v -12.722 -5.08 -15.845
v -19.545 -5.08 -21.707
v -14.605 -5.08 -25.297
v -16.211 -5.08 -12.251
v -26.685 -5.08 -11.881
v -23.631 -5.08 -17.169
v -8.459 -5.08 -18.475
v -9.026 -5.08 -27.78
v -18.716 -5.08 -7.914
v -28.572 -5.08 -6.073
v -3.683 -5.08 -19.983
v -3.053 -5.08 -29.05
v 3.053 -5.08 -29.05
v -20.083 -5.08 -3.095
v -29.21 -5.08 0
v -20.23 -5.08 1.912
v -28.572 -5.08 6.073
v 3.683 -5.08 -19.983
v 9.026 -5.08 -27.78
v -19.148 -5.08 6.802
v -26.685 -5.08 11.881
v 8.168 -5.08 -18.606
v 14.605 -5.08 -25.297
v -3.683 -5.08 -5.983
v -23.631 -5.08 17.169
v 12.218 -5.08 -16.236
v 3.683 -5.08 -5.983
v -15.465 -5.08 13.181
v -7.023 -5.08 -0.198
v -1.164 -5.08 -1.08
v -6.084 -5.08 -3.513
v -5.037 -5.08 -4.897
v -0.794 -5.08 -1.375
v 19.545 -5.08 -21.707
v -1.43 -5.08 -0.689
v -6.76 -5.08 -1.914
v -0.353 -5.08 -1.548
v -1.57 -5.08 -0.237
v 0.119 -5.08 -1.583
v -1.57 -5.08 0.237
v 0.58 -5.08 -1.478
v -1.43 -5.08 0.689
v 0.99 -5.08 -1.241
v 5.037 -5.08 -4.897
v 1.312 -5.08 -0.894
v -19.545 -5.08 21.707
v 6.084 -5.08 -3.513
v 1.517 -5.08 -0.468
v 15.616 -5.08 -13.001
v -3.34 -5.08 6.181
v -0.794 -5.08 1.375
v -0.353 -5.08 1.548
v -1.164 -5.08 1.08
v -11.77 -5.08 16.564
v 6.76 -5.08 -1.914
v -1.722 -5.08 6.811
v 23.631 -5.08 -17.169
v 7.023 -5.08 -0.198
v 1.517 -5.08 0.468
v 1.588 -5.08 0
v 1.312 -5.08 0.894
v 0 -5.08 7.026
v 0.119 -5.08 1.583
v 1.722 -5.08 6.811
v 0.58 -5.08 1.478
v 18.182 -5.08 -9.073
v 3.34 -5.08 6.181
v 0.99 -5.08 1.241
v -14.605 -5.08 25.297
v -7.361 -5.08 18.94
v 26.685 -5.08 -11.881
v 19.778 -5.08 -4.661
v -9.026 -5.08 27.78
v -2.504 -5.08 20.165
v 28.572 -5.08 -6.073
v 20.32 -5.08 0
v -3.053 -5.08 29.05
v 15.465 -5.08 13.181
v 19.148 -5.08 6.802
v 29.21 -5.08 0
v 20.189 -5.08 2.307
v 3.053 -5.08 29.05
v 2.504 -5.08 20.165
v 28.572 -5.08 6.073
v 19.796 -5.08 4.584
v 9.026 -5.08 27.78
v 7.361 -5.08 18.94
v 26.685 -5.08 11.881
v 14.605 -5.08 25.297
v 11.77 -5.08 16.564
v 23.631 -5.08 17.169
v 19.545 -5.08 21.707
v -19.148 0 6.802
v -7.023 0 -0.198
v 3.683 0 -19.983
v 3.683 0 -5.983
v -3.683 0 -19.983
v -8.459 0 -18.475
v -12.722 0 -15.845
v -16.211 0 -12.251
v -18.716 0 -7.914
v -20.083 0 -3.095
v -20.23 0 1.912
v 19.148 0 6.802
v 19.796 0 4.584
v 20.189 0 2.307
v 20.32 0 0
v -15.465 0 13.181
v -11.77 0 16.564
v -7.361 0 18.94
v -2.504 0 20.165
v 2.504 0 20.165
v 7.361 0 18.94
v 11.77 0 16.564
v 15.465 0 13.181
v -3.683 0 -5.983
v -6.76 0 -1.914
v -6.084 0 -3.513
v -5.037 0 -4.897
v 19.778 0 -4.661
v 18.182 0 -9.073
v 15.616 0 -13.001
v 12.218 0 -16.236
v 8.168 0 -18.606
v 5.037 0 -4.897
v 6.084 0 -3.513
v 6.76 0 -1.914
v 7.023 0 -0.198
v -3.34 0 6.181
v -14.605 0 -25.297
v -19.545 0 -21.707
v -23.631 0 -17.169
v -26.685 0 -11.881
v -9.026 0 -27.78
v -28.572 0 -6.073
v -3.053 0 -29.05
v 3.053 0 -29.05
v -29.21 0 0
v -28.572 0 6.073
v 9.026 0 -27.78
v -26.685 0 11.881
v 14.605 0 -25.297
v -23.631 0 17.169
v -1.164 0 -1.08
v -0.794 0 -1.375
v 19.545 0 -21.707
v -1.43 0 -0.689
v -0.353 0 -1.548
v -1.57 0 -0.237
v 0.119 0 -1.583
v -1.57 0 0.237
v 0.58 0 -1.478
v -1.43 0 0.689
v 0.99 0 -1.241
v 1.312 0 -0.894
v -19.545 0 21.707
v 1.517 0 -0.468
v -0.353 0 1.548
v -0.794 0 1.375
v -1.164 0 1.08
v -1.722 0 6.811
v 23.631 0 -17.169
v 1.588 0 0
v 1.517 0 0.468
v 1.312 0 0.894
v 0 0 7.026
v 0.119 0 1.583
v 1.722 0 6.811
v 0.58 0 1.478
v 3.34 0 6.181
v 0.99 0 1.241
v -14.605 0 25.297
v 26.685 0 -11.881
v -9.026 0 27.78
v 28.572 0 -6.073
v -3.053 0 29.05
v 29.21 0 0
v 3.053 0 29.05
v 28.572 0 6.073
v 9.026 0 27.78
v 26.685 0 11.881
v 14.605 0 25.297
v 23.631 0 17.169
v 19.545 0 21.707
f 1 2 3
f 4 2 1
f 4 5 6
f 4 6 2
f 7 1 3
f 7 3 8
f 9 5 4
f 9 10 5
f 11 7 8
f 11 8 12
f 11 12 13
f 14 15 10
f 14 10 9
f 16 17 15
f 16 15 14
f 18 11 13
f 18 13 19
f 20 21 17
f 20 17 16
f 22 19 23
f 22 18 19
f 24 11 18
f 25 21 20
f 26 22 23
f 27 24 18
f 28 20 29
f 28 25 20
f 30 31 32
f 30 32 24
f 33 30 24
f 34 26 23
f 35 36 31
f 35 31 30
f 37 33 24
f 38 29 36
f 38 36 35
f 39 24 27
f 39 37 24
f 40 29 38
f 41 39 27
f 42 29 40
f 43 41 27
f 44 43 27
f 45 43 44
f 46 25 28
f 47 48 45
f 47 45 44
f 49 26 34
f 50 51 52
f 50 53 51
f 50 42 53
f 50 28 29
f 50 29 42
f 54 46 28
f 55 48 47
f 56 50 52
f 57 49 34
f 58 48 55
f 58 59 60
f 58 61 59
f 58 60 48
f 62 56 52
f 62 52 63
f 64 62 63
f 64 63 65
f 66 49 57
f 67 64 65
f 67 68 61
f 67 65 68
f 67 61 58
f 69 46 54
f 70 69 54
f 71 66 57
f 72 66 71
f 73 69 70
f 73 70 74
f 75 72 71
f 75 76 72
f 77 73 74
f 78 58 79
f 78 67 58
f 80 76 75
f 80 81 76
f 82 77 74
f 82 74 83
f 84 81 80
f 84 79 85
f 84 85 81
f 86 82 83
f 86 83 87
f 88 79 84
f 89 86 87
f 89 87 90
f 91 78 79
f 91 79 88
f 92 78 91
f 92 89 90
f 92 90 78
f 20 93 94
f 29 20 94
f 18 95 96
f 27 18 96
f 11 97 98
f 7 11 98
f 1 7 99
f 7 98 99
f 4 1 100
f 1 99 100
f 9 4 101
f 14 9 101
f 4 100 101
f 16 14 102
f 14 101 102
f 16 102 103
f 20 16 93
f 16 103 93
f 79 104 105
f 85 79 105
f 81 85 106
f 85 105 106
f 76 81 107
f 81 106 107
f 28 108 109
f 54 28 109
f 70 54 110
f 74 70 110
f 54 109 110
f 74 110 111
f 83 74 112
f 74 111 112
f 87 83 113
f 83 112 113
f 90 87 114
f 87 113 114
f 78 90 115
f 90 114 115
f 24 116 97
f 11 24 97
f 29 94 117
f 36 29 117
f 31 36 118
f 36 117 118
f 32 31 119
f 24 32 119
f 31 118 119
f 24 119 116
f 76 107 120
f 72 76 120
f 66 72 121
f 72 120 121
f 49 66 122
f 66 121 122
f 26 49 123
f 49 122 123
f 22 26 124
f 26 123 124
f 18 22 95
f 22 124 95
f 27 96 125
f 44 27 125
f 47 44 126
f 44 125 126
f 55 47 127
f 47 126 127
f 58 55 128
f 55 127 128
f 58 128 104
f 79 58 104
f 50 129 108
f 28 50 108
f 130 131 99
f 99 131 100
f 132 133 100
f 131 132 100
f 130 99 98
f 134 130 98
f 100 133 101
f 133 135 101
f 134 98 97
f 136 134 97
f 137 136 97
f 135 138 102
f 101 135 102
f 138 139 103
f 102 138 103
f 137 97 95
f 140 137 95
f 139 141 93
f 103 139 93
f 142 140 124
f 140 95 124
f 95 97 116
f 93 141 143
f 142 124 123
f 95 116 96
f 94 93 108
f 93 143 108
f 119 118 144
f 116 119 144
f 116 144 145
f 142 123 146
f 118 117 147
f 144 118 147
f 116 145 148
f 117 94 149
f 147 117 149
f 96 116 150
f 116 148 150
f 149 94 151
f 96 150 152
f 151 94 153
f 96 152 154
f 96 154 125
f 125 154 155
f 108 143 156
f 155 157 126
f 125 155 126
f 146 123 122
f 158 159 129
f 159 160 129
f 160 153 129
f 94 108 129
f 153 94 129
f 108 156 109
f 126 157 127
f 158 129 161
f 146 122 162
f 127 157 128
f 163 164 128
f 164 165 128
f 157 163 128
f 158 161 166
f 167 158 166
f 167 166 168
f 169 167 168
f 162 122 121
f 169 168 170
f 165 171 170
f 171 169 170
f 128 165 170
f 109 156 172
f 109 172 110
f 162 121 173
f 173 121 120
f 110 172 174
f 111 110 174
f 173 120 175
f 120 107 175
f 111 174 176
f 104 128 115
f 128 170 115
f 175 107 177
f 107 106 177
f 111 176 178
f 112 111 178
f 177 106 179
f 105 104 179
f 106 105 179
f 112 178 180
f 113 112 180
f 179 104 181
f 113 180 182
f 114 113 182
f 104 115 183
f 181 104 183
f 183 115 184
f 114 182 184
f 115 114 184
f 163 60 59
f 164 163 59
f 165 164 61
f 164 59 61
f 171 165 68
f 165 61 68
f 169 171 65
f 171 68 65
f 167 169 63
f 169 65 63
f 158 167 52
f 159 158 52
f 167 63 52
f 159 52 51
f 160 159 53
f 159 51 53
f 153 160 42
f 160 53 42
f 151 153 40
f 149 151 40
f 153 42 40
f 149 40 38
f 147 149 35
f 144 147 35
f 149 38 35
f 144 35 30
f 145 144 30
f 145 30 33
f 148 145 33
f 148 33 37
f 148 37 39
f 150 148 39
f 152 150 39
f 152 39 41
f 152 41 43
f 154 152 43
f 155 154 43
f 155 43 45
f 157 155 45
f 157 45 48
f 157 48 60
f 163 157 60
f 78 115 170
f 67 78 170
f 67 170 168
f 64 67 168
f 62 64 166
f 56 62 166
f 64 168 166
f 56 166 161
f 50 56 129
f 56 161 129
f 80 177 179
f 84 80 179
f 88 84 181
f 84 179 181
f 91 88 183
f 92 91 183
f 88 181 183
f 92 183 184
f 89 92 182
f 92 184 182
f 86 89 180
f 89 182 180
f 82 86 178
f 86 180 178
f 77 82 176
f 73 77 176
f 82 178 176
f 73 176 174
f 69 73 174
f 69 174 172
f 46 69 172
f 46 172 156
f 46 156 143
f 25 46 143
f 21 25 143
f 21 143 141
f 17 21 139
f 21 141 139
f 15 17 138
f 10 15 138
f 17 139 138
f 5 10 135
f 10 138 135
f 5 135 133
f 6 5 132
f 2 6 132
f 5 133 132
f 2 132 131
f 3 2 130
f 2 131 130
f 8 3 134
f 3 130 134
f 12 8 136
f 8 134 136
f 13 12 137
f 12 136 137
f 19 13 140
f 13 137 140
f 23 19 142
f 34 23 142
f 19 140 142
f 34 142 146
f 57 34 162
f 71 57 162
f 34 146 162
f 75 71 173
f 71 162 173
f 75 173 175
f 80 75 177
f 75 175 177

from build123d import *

# Parameters (mm, degrees)
F0_R     = 29.21
F1_DEPTH = 5.08
F2_R     = 1.5875
F3_DEPTH = 25.4


with BuildPart() as f1:
    # F0 (on Front) → F1 (new body)
    with BuildSketch(Plane.XZ):
        Circle(F0_R)
        with BuildLine():
            ThreePointArc((19.147667, 6.802149), (20.024772, 3.451217), (20.32, 0))
            ThreePointArc((20.32, 0), (15.616353, -13.001228), (3.683, -19.983441))
            ThreePointArc((3.683, -19.983441), (1.849173, -20.235685), (0, -20.32))
            ThreePointArc((0, -20.32), (-1.849173, -20.235685), (-3.683, -19.983441))
            ThreePointArc((-3.683, -19.983441), (-17.597636, -10.16), (-19.147667, 6.802149))
            ThreePointArc((-19.147667, 6.802149), (-17.597636, 10.16), (-15.464667, 13.181292))
            ThreePointArc((-15.464667, 13.181292), (0, 20.32), (15.464667, 13.181292))
            ThreePointArc((15.464667, 13.181292), (17.597636, 10.16), (19.147667, 6.802149))
        make_face(mode=Mode.SUBTRACT)
        with BuildLine():
            Line((-3.339771, 6.18098), (-15.464667, 13.181292))
            ThreePointArc((-15.464667, 13.181292), (-17.597636, 10.16), (-19.147667, 6.802149))
            Line((-19.147667, 6.802149), (-7.022771, -0.198163))
            ThreePointArc((-7.022771, -0.198163), (-6.084319, 3.512783), (-3.339771, 6.18098))
        make_face()
        with BuildLine():
            ThreePointArc((3.683, -5.982817), (6.084319, -3.512783), (7.022771, -0.198163))
            ThreePointArc((7.022771, -0.198163), (7.024868, -0.099091), (7.025567, 0))
            ThreePointArc((7.025567, 0), (6.034168, 3.59825), (3.339771, 6.18098))
            ThreePointArc((3.339771, 6.18098), (0, 7.025567), (-3.339771, 6.18098))
            ThreePointArc((-3.339771, 6.18098), (-6.084319, 3.512783), (-7.022771, -0.198163))
            ThreePointArc((-7.022771, -0.198163), (-6.084319, -3.512783), (-3.683, -5.982817))
            ThreePointArc((-3.683, -5.982817), (-1.913885, -6.759854), (0, -7.025567))
            ThreePointArc((0, -7.025567), (1.913885, -6.759854), (3.683, -5.982817))
        make_face()
        with BuildLine():
            ThreePointArc((0, -20.32), (1.849173, -20.235685), (3.683, -19.983441))
            Line((3.683, -19.983441), (3.683, -5.982817))
            ThreePointArc((3.683, -5.982817), (1.913885, -6.759854), (0, -7.025567))
            Line((0, -7.025567), (0, -20.32))
        make_face()
        with BuildLine():
            Line((7.022771, -0.198163), (19.147667, 6.802149))
            ThreePointArc((19.147667, 6.802149), (17.597636, 10.16), (15.464667, 13.181292))
            Line((15.464667, 13.181292), (3.339771, 6.18098))
            ThreePointArc((3.339771, 6.18098), (6.034168, 3.59825), (7.025567, 0))
            ThreePointArc((7.025567, 0), (7.024868, -0.099091), (7.022771, -0.198163))
        make_face()
        with BuildLine():
            ThreePointArc((-3.683, -19.983441), (-1.849173, -20.235685), (0, -20.32))
            Line((0, -20.32), (0, -7.025567))
            ThreePointArc((0, -7.025567), (-1.913885, -6.759854), (-3.683, -5.982817))
            Line((-3.683, -5.982817), (-3.683, -19.983441))
        make_face()
    extrude(amount=F1_DEPTH)

    # F2 (on face) → F3 (cut)
    with BuildSketch(Plane.XZ.offset(5.08)):
        Circle(F2_R)
    extrude(amount=-F3_DEPTH, mode=Mode.SUBTRACT)


solid = f1.part
